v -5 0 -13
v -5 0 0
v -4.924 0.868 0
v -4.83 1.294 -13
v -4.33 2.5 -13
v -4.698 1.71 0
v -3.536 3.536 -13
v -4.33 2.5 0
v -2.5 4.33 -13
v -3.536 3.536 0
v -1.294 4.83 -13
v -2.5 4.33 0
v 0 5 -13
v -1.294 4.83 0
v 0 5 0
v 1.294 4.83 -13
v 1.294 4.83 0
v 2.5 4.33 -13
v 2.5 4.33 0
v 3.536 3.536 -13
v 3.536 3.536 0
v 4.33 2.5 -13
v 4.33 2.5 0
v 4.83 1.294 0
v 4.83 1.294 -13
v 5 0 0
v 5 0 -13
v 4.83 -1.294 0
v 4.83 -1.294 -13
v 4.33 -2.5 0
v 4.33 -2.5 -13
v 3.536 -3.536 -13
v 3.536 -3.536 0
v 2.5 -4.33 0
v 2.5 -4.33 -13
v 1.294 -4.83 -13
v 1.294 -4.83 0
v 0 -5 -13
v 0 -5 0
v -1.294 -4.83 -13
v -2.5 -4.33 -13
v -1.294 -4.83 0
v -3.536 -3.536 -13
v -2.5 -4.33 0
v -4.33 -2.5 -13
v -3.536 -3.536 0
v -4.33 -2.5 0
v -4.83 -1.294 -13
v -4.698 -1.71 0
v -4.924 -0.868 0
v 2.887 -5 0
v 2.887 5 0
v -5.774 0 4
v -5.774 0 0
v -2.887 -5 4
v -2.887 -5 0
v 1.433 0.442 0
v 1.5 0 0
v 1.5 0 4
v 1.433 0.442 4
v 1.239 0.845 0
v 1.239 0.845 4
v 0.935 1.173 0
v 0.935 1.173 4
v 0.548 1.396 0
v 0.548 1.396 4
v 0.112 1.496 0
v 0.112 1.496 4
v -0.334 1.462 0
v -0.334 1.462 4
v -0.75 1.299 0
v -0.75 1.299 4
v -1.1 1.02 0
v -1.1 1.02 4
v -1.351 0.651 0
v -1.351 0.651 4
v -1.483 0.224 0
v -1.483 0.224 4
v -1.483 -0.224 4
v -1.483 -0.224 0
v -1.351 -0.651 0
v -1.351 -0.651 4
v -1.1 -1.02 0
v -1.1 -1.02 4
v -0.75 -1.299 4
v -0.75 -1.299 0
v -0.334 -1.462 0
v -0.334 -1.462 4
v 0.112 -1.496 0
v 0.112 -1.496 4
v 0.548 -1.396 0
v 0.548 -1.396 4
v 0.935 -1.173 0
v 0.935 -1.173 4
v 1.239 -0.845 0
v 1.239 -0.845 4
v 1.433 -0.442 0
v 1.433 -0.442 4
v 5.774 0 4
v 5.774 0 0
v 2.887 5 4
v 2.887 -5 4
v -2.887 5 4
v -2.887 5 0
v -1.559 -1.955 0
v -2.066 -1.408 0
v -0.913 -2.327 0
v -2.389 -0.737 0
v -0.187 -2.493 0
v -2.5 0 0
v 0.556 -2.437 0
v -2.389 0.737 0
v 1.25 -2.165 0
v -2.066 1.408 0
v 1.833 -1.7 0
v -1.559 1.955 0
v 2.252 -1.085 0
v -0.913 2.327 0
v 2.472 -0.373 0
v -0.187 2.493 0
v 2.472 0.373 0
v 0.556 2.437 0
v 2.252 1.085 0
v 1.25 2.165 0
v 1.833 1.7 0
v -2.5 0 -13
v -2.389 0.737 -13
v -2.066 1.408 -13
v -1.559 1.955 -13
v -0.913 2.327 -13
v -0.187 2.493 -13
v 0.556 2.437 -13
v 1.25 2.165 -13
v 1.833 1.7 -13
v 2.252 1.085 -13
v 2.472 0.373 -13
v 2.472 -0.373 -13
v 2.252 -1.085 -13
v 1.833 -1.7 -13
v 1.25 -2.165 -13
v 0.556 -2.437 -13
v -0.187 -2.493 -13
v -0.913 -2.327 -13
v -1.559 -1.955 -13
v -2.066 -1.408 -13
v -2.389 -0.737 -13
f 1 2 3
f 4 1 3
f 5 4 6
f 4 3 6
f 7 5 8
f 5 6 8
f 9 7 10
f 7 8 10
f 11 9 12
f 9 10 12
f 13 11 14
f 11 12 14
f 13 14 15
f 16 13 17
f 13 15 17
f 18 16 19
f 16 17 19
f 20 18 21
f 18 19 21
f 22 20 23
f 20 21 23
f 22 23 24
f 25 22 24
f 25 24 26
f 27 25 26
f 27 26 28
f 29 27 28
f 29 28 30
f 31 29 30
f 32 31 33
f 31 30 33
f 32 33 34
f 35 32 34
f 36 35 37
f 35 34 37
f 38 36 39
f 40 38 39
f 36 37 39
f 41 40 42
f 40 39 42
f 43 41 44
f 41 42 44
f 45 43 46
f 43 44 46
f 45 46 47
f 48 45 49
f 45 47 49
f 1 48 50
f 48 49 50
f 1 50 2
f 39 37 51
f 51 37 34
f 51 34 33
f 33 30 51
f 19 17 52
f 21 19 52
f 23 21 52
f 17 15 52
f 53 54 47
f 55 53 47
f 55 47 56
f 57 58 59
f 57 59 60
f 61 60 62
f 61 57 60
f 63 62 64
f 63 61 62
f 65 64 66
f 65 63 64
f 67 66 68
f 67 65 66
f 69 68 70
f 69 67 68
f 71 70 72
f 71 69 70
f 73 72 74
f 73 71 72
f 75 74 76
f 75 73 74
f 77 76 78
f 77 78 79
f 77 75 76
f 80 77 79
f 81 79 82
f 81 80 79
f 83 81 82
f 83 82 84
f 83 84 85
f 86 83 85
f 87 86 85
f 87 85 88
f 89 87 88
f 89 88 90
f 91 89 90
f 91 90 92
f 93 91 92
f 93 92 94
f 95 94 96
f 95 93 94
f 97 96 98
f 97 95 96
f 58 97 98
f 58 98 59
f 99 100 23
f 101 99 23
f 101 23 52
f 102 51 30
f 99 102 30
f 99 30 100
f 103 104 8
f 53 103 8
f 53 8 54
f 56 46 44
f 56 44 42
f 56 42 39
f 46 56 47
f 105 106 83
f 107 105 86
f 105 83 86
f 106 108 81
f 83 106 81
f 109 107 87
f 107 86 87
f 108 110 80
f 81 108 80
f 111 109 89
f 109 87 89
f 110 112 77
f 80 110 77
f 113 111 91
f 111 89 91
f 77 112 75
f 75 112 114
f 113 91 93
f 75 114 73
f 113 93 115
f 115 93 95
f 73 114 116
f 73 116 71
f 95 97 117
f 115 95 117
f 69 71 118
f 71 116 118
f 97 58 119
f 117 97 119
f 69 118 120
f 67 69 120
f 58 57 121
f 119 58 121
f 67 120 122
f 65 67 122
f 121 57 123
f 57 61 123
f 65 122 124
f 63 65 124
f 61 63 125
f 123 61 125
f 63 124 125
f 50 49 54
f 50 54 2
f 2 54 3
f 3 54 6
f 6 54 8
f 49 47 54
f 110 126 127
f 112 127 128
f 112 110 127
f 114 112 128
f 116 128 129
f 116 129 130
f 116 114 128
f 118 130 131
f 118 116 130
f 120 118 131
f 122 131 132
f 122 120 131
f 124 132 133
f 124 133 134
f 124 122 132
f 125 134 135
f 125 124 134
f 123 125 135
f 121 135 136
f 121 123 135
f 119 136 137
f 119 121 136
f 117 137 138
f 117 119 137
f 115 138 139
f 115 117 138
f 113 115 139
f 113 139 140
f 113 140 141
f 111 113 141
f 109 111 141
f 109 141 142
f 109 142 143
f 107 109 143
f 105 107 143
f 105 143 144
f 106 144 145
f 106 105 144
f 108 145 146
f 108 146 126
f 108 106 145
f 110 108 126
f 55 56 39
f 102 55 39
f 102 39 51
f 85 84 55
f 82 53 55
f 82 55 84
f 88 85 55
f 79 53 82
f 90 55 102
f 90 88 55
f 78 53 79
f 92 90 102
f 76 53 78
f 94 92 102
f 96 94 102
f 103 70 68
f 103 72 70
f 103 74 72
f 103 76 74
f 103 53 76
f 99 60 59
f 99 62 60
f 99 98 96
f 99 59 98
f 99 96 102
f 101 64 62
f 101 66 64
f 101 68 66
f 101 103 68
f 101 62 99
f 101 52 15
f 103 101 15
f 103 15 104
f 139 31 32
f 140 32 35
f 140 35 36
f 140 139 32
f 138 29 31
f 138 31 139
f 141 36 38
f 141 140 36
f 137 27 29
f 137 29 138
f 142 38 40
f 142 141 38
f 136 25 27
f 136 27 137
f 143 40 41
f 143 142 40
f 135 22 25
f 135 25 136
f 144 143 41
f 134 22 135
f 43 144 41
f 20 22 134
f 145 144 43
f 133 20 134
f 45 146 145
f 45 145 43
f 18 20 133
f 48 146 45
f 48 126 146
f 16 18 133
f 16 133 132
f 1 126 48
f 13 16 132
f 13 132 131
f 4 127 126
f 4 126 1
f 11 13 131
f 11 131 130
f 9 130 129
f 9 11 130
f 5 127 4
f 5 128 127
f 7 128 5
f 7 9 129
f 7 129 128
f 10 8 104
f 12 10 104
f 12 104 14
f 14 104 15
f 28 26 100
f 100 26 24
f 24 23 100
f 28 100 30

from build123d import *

# Parameters (mm, degrees)
CROQUIS2_R              = 1.5
SALIENTE_EXTRUIR1_DEPTH = 4
CROQUIS3_R              = 5
CROQUIS3_R_2            = 2.5
SALIENTE_EXTRUIR2_DEPTH = 13


with BuildPart() as part:
    # Croquis2 → Saliente-Extruir1 (new body)
    with BuildSketch(Plane.XY):
        Polygon((2.886751346, 5), (-2.886751346, 5), (-5.773502692, 0), (-2.886751346, -5), (2.886751346, -5), (5.773502692, 0), align=None)
        Circle(CROQUIS2_R, mode=Mode.SUBTRACT)
    extrude(amount=SALIENTE_EXTRUIR1_DEPTH)

    # Croquis3 → Saliente-Extruir2 (add)
    with BuildSketch(Plane(origin=(0, 0, 0), x_dir=(-1, 0, 0), z_dir=(0, 0, -1))):
        Circle(CROQUIS3_R)
        Circle(CROQUIS3_R_2, mode=Mode.SUBTRACT)
    extrude(amount=SALIENTE_EXTRUIR2_DEPTH)


solid = part.part
